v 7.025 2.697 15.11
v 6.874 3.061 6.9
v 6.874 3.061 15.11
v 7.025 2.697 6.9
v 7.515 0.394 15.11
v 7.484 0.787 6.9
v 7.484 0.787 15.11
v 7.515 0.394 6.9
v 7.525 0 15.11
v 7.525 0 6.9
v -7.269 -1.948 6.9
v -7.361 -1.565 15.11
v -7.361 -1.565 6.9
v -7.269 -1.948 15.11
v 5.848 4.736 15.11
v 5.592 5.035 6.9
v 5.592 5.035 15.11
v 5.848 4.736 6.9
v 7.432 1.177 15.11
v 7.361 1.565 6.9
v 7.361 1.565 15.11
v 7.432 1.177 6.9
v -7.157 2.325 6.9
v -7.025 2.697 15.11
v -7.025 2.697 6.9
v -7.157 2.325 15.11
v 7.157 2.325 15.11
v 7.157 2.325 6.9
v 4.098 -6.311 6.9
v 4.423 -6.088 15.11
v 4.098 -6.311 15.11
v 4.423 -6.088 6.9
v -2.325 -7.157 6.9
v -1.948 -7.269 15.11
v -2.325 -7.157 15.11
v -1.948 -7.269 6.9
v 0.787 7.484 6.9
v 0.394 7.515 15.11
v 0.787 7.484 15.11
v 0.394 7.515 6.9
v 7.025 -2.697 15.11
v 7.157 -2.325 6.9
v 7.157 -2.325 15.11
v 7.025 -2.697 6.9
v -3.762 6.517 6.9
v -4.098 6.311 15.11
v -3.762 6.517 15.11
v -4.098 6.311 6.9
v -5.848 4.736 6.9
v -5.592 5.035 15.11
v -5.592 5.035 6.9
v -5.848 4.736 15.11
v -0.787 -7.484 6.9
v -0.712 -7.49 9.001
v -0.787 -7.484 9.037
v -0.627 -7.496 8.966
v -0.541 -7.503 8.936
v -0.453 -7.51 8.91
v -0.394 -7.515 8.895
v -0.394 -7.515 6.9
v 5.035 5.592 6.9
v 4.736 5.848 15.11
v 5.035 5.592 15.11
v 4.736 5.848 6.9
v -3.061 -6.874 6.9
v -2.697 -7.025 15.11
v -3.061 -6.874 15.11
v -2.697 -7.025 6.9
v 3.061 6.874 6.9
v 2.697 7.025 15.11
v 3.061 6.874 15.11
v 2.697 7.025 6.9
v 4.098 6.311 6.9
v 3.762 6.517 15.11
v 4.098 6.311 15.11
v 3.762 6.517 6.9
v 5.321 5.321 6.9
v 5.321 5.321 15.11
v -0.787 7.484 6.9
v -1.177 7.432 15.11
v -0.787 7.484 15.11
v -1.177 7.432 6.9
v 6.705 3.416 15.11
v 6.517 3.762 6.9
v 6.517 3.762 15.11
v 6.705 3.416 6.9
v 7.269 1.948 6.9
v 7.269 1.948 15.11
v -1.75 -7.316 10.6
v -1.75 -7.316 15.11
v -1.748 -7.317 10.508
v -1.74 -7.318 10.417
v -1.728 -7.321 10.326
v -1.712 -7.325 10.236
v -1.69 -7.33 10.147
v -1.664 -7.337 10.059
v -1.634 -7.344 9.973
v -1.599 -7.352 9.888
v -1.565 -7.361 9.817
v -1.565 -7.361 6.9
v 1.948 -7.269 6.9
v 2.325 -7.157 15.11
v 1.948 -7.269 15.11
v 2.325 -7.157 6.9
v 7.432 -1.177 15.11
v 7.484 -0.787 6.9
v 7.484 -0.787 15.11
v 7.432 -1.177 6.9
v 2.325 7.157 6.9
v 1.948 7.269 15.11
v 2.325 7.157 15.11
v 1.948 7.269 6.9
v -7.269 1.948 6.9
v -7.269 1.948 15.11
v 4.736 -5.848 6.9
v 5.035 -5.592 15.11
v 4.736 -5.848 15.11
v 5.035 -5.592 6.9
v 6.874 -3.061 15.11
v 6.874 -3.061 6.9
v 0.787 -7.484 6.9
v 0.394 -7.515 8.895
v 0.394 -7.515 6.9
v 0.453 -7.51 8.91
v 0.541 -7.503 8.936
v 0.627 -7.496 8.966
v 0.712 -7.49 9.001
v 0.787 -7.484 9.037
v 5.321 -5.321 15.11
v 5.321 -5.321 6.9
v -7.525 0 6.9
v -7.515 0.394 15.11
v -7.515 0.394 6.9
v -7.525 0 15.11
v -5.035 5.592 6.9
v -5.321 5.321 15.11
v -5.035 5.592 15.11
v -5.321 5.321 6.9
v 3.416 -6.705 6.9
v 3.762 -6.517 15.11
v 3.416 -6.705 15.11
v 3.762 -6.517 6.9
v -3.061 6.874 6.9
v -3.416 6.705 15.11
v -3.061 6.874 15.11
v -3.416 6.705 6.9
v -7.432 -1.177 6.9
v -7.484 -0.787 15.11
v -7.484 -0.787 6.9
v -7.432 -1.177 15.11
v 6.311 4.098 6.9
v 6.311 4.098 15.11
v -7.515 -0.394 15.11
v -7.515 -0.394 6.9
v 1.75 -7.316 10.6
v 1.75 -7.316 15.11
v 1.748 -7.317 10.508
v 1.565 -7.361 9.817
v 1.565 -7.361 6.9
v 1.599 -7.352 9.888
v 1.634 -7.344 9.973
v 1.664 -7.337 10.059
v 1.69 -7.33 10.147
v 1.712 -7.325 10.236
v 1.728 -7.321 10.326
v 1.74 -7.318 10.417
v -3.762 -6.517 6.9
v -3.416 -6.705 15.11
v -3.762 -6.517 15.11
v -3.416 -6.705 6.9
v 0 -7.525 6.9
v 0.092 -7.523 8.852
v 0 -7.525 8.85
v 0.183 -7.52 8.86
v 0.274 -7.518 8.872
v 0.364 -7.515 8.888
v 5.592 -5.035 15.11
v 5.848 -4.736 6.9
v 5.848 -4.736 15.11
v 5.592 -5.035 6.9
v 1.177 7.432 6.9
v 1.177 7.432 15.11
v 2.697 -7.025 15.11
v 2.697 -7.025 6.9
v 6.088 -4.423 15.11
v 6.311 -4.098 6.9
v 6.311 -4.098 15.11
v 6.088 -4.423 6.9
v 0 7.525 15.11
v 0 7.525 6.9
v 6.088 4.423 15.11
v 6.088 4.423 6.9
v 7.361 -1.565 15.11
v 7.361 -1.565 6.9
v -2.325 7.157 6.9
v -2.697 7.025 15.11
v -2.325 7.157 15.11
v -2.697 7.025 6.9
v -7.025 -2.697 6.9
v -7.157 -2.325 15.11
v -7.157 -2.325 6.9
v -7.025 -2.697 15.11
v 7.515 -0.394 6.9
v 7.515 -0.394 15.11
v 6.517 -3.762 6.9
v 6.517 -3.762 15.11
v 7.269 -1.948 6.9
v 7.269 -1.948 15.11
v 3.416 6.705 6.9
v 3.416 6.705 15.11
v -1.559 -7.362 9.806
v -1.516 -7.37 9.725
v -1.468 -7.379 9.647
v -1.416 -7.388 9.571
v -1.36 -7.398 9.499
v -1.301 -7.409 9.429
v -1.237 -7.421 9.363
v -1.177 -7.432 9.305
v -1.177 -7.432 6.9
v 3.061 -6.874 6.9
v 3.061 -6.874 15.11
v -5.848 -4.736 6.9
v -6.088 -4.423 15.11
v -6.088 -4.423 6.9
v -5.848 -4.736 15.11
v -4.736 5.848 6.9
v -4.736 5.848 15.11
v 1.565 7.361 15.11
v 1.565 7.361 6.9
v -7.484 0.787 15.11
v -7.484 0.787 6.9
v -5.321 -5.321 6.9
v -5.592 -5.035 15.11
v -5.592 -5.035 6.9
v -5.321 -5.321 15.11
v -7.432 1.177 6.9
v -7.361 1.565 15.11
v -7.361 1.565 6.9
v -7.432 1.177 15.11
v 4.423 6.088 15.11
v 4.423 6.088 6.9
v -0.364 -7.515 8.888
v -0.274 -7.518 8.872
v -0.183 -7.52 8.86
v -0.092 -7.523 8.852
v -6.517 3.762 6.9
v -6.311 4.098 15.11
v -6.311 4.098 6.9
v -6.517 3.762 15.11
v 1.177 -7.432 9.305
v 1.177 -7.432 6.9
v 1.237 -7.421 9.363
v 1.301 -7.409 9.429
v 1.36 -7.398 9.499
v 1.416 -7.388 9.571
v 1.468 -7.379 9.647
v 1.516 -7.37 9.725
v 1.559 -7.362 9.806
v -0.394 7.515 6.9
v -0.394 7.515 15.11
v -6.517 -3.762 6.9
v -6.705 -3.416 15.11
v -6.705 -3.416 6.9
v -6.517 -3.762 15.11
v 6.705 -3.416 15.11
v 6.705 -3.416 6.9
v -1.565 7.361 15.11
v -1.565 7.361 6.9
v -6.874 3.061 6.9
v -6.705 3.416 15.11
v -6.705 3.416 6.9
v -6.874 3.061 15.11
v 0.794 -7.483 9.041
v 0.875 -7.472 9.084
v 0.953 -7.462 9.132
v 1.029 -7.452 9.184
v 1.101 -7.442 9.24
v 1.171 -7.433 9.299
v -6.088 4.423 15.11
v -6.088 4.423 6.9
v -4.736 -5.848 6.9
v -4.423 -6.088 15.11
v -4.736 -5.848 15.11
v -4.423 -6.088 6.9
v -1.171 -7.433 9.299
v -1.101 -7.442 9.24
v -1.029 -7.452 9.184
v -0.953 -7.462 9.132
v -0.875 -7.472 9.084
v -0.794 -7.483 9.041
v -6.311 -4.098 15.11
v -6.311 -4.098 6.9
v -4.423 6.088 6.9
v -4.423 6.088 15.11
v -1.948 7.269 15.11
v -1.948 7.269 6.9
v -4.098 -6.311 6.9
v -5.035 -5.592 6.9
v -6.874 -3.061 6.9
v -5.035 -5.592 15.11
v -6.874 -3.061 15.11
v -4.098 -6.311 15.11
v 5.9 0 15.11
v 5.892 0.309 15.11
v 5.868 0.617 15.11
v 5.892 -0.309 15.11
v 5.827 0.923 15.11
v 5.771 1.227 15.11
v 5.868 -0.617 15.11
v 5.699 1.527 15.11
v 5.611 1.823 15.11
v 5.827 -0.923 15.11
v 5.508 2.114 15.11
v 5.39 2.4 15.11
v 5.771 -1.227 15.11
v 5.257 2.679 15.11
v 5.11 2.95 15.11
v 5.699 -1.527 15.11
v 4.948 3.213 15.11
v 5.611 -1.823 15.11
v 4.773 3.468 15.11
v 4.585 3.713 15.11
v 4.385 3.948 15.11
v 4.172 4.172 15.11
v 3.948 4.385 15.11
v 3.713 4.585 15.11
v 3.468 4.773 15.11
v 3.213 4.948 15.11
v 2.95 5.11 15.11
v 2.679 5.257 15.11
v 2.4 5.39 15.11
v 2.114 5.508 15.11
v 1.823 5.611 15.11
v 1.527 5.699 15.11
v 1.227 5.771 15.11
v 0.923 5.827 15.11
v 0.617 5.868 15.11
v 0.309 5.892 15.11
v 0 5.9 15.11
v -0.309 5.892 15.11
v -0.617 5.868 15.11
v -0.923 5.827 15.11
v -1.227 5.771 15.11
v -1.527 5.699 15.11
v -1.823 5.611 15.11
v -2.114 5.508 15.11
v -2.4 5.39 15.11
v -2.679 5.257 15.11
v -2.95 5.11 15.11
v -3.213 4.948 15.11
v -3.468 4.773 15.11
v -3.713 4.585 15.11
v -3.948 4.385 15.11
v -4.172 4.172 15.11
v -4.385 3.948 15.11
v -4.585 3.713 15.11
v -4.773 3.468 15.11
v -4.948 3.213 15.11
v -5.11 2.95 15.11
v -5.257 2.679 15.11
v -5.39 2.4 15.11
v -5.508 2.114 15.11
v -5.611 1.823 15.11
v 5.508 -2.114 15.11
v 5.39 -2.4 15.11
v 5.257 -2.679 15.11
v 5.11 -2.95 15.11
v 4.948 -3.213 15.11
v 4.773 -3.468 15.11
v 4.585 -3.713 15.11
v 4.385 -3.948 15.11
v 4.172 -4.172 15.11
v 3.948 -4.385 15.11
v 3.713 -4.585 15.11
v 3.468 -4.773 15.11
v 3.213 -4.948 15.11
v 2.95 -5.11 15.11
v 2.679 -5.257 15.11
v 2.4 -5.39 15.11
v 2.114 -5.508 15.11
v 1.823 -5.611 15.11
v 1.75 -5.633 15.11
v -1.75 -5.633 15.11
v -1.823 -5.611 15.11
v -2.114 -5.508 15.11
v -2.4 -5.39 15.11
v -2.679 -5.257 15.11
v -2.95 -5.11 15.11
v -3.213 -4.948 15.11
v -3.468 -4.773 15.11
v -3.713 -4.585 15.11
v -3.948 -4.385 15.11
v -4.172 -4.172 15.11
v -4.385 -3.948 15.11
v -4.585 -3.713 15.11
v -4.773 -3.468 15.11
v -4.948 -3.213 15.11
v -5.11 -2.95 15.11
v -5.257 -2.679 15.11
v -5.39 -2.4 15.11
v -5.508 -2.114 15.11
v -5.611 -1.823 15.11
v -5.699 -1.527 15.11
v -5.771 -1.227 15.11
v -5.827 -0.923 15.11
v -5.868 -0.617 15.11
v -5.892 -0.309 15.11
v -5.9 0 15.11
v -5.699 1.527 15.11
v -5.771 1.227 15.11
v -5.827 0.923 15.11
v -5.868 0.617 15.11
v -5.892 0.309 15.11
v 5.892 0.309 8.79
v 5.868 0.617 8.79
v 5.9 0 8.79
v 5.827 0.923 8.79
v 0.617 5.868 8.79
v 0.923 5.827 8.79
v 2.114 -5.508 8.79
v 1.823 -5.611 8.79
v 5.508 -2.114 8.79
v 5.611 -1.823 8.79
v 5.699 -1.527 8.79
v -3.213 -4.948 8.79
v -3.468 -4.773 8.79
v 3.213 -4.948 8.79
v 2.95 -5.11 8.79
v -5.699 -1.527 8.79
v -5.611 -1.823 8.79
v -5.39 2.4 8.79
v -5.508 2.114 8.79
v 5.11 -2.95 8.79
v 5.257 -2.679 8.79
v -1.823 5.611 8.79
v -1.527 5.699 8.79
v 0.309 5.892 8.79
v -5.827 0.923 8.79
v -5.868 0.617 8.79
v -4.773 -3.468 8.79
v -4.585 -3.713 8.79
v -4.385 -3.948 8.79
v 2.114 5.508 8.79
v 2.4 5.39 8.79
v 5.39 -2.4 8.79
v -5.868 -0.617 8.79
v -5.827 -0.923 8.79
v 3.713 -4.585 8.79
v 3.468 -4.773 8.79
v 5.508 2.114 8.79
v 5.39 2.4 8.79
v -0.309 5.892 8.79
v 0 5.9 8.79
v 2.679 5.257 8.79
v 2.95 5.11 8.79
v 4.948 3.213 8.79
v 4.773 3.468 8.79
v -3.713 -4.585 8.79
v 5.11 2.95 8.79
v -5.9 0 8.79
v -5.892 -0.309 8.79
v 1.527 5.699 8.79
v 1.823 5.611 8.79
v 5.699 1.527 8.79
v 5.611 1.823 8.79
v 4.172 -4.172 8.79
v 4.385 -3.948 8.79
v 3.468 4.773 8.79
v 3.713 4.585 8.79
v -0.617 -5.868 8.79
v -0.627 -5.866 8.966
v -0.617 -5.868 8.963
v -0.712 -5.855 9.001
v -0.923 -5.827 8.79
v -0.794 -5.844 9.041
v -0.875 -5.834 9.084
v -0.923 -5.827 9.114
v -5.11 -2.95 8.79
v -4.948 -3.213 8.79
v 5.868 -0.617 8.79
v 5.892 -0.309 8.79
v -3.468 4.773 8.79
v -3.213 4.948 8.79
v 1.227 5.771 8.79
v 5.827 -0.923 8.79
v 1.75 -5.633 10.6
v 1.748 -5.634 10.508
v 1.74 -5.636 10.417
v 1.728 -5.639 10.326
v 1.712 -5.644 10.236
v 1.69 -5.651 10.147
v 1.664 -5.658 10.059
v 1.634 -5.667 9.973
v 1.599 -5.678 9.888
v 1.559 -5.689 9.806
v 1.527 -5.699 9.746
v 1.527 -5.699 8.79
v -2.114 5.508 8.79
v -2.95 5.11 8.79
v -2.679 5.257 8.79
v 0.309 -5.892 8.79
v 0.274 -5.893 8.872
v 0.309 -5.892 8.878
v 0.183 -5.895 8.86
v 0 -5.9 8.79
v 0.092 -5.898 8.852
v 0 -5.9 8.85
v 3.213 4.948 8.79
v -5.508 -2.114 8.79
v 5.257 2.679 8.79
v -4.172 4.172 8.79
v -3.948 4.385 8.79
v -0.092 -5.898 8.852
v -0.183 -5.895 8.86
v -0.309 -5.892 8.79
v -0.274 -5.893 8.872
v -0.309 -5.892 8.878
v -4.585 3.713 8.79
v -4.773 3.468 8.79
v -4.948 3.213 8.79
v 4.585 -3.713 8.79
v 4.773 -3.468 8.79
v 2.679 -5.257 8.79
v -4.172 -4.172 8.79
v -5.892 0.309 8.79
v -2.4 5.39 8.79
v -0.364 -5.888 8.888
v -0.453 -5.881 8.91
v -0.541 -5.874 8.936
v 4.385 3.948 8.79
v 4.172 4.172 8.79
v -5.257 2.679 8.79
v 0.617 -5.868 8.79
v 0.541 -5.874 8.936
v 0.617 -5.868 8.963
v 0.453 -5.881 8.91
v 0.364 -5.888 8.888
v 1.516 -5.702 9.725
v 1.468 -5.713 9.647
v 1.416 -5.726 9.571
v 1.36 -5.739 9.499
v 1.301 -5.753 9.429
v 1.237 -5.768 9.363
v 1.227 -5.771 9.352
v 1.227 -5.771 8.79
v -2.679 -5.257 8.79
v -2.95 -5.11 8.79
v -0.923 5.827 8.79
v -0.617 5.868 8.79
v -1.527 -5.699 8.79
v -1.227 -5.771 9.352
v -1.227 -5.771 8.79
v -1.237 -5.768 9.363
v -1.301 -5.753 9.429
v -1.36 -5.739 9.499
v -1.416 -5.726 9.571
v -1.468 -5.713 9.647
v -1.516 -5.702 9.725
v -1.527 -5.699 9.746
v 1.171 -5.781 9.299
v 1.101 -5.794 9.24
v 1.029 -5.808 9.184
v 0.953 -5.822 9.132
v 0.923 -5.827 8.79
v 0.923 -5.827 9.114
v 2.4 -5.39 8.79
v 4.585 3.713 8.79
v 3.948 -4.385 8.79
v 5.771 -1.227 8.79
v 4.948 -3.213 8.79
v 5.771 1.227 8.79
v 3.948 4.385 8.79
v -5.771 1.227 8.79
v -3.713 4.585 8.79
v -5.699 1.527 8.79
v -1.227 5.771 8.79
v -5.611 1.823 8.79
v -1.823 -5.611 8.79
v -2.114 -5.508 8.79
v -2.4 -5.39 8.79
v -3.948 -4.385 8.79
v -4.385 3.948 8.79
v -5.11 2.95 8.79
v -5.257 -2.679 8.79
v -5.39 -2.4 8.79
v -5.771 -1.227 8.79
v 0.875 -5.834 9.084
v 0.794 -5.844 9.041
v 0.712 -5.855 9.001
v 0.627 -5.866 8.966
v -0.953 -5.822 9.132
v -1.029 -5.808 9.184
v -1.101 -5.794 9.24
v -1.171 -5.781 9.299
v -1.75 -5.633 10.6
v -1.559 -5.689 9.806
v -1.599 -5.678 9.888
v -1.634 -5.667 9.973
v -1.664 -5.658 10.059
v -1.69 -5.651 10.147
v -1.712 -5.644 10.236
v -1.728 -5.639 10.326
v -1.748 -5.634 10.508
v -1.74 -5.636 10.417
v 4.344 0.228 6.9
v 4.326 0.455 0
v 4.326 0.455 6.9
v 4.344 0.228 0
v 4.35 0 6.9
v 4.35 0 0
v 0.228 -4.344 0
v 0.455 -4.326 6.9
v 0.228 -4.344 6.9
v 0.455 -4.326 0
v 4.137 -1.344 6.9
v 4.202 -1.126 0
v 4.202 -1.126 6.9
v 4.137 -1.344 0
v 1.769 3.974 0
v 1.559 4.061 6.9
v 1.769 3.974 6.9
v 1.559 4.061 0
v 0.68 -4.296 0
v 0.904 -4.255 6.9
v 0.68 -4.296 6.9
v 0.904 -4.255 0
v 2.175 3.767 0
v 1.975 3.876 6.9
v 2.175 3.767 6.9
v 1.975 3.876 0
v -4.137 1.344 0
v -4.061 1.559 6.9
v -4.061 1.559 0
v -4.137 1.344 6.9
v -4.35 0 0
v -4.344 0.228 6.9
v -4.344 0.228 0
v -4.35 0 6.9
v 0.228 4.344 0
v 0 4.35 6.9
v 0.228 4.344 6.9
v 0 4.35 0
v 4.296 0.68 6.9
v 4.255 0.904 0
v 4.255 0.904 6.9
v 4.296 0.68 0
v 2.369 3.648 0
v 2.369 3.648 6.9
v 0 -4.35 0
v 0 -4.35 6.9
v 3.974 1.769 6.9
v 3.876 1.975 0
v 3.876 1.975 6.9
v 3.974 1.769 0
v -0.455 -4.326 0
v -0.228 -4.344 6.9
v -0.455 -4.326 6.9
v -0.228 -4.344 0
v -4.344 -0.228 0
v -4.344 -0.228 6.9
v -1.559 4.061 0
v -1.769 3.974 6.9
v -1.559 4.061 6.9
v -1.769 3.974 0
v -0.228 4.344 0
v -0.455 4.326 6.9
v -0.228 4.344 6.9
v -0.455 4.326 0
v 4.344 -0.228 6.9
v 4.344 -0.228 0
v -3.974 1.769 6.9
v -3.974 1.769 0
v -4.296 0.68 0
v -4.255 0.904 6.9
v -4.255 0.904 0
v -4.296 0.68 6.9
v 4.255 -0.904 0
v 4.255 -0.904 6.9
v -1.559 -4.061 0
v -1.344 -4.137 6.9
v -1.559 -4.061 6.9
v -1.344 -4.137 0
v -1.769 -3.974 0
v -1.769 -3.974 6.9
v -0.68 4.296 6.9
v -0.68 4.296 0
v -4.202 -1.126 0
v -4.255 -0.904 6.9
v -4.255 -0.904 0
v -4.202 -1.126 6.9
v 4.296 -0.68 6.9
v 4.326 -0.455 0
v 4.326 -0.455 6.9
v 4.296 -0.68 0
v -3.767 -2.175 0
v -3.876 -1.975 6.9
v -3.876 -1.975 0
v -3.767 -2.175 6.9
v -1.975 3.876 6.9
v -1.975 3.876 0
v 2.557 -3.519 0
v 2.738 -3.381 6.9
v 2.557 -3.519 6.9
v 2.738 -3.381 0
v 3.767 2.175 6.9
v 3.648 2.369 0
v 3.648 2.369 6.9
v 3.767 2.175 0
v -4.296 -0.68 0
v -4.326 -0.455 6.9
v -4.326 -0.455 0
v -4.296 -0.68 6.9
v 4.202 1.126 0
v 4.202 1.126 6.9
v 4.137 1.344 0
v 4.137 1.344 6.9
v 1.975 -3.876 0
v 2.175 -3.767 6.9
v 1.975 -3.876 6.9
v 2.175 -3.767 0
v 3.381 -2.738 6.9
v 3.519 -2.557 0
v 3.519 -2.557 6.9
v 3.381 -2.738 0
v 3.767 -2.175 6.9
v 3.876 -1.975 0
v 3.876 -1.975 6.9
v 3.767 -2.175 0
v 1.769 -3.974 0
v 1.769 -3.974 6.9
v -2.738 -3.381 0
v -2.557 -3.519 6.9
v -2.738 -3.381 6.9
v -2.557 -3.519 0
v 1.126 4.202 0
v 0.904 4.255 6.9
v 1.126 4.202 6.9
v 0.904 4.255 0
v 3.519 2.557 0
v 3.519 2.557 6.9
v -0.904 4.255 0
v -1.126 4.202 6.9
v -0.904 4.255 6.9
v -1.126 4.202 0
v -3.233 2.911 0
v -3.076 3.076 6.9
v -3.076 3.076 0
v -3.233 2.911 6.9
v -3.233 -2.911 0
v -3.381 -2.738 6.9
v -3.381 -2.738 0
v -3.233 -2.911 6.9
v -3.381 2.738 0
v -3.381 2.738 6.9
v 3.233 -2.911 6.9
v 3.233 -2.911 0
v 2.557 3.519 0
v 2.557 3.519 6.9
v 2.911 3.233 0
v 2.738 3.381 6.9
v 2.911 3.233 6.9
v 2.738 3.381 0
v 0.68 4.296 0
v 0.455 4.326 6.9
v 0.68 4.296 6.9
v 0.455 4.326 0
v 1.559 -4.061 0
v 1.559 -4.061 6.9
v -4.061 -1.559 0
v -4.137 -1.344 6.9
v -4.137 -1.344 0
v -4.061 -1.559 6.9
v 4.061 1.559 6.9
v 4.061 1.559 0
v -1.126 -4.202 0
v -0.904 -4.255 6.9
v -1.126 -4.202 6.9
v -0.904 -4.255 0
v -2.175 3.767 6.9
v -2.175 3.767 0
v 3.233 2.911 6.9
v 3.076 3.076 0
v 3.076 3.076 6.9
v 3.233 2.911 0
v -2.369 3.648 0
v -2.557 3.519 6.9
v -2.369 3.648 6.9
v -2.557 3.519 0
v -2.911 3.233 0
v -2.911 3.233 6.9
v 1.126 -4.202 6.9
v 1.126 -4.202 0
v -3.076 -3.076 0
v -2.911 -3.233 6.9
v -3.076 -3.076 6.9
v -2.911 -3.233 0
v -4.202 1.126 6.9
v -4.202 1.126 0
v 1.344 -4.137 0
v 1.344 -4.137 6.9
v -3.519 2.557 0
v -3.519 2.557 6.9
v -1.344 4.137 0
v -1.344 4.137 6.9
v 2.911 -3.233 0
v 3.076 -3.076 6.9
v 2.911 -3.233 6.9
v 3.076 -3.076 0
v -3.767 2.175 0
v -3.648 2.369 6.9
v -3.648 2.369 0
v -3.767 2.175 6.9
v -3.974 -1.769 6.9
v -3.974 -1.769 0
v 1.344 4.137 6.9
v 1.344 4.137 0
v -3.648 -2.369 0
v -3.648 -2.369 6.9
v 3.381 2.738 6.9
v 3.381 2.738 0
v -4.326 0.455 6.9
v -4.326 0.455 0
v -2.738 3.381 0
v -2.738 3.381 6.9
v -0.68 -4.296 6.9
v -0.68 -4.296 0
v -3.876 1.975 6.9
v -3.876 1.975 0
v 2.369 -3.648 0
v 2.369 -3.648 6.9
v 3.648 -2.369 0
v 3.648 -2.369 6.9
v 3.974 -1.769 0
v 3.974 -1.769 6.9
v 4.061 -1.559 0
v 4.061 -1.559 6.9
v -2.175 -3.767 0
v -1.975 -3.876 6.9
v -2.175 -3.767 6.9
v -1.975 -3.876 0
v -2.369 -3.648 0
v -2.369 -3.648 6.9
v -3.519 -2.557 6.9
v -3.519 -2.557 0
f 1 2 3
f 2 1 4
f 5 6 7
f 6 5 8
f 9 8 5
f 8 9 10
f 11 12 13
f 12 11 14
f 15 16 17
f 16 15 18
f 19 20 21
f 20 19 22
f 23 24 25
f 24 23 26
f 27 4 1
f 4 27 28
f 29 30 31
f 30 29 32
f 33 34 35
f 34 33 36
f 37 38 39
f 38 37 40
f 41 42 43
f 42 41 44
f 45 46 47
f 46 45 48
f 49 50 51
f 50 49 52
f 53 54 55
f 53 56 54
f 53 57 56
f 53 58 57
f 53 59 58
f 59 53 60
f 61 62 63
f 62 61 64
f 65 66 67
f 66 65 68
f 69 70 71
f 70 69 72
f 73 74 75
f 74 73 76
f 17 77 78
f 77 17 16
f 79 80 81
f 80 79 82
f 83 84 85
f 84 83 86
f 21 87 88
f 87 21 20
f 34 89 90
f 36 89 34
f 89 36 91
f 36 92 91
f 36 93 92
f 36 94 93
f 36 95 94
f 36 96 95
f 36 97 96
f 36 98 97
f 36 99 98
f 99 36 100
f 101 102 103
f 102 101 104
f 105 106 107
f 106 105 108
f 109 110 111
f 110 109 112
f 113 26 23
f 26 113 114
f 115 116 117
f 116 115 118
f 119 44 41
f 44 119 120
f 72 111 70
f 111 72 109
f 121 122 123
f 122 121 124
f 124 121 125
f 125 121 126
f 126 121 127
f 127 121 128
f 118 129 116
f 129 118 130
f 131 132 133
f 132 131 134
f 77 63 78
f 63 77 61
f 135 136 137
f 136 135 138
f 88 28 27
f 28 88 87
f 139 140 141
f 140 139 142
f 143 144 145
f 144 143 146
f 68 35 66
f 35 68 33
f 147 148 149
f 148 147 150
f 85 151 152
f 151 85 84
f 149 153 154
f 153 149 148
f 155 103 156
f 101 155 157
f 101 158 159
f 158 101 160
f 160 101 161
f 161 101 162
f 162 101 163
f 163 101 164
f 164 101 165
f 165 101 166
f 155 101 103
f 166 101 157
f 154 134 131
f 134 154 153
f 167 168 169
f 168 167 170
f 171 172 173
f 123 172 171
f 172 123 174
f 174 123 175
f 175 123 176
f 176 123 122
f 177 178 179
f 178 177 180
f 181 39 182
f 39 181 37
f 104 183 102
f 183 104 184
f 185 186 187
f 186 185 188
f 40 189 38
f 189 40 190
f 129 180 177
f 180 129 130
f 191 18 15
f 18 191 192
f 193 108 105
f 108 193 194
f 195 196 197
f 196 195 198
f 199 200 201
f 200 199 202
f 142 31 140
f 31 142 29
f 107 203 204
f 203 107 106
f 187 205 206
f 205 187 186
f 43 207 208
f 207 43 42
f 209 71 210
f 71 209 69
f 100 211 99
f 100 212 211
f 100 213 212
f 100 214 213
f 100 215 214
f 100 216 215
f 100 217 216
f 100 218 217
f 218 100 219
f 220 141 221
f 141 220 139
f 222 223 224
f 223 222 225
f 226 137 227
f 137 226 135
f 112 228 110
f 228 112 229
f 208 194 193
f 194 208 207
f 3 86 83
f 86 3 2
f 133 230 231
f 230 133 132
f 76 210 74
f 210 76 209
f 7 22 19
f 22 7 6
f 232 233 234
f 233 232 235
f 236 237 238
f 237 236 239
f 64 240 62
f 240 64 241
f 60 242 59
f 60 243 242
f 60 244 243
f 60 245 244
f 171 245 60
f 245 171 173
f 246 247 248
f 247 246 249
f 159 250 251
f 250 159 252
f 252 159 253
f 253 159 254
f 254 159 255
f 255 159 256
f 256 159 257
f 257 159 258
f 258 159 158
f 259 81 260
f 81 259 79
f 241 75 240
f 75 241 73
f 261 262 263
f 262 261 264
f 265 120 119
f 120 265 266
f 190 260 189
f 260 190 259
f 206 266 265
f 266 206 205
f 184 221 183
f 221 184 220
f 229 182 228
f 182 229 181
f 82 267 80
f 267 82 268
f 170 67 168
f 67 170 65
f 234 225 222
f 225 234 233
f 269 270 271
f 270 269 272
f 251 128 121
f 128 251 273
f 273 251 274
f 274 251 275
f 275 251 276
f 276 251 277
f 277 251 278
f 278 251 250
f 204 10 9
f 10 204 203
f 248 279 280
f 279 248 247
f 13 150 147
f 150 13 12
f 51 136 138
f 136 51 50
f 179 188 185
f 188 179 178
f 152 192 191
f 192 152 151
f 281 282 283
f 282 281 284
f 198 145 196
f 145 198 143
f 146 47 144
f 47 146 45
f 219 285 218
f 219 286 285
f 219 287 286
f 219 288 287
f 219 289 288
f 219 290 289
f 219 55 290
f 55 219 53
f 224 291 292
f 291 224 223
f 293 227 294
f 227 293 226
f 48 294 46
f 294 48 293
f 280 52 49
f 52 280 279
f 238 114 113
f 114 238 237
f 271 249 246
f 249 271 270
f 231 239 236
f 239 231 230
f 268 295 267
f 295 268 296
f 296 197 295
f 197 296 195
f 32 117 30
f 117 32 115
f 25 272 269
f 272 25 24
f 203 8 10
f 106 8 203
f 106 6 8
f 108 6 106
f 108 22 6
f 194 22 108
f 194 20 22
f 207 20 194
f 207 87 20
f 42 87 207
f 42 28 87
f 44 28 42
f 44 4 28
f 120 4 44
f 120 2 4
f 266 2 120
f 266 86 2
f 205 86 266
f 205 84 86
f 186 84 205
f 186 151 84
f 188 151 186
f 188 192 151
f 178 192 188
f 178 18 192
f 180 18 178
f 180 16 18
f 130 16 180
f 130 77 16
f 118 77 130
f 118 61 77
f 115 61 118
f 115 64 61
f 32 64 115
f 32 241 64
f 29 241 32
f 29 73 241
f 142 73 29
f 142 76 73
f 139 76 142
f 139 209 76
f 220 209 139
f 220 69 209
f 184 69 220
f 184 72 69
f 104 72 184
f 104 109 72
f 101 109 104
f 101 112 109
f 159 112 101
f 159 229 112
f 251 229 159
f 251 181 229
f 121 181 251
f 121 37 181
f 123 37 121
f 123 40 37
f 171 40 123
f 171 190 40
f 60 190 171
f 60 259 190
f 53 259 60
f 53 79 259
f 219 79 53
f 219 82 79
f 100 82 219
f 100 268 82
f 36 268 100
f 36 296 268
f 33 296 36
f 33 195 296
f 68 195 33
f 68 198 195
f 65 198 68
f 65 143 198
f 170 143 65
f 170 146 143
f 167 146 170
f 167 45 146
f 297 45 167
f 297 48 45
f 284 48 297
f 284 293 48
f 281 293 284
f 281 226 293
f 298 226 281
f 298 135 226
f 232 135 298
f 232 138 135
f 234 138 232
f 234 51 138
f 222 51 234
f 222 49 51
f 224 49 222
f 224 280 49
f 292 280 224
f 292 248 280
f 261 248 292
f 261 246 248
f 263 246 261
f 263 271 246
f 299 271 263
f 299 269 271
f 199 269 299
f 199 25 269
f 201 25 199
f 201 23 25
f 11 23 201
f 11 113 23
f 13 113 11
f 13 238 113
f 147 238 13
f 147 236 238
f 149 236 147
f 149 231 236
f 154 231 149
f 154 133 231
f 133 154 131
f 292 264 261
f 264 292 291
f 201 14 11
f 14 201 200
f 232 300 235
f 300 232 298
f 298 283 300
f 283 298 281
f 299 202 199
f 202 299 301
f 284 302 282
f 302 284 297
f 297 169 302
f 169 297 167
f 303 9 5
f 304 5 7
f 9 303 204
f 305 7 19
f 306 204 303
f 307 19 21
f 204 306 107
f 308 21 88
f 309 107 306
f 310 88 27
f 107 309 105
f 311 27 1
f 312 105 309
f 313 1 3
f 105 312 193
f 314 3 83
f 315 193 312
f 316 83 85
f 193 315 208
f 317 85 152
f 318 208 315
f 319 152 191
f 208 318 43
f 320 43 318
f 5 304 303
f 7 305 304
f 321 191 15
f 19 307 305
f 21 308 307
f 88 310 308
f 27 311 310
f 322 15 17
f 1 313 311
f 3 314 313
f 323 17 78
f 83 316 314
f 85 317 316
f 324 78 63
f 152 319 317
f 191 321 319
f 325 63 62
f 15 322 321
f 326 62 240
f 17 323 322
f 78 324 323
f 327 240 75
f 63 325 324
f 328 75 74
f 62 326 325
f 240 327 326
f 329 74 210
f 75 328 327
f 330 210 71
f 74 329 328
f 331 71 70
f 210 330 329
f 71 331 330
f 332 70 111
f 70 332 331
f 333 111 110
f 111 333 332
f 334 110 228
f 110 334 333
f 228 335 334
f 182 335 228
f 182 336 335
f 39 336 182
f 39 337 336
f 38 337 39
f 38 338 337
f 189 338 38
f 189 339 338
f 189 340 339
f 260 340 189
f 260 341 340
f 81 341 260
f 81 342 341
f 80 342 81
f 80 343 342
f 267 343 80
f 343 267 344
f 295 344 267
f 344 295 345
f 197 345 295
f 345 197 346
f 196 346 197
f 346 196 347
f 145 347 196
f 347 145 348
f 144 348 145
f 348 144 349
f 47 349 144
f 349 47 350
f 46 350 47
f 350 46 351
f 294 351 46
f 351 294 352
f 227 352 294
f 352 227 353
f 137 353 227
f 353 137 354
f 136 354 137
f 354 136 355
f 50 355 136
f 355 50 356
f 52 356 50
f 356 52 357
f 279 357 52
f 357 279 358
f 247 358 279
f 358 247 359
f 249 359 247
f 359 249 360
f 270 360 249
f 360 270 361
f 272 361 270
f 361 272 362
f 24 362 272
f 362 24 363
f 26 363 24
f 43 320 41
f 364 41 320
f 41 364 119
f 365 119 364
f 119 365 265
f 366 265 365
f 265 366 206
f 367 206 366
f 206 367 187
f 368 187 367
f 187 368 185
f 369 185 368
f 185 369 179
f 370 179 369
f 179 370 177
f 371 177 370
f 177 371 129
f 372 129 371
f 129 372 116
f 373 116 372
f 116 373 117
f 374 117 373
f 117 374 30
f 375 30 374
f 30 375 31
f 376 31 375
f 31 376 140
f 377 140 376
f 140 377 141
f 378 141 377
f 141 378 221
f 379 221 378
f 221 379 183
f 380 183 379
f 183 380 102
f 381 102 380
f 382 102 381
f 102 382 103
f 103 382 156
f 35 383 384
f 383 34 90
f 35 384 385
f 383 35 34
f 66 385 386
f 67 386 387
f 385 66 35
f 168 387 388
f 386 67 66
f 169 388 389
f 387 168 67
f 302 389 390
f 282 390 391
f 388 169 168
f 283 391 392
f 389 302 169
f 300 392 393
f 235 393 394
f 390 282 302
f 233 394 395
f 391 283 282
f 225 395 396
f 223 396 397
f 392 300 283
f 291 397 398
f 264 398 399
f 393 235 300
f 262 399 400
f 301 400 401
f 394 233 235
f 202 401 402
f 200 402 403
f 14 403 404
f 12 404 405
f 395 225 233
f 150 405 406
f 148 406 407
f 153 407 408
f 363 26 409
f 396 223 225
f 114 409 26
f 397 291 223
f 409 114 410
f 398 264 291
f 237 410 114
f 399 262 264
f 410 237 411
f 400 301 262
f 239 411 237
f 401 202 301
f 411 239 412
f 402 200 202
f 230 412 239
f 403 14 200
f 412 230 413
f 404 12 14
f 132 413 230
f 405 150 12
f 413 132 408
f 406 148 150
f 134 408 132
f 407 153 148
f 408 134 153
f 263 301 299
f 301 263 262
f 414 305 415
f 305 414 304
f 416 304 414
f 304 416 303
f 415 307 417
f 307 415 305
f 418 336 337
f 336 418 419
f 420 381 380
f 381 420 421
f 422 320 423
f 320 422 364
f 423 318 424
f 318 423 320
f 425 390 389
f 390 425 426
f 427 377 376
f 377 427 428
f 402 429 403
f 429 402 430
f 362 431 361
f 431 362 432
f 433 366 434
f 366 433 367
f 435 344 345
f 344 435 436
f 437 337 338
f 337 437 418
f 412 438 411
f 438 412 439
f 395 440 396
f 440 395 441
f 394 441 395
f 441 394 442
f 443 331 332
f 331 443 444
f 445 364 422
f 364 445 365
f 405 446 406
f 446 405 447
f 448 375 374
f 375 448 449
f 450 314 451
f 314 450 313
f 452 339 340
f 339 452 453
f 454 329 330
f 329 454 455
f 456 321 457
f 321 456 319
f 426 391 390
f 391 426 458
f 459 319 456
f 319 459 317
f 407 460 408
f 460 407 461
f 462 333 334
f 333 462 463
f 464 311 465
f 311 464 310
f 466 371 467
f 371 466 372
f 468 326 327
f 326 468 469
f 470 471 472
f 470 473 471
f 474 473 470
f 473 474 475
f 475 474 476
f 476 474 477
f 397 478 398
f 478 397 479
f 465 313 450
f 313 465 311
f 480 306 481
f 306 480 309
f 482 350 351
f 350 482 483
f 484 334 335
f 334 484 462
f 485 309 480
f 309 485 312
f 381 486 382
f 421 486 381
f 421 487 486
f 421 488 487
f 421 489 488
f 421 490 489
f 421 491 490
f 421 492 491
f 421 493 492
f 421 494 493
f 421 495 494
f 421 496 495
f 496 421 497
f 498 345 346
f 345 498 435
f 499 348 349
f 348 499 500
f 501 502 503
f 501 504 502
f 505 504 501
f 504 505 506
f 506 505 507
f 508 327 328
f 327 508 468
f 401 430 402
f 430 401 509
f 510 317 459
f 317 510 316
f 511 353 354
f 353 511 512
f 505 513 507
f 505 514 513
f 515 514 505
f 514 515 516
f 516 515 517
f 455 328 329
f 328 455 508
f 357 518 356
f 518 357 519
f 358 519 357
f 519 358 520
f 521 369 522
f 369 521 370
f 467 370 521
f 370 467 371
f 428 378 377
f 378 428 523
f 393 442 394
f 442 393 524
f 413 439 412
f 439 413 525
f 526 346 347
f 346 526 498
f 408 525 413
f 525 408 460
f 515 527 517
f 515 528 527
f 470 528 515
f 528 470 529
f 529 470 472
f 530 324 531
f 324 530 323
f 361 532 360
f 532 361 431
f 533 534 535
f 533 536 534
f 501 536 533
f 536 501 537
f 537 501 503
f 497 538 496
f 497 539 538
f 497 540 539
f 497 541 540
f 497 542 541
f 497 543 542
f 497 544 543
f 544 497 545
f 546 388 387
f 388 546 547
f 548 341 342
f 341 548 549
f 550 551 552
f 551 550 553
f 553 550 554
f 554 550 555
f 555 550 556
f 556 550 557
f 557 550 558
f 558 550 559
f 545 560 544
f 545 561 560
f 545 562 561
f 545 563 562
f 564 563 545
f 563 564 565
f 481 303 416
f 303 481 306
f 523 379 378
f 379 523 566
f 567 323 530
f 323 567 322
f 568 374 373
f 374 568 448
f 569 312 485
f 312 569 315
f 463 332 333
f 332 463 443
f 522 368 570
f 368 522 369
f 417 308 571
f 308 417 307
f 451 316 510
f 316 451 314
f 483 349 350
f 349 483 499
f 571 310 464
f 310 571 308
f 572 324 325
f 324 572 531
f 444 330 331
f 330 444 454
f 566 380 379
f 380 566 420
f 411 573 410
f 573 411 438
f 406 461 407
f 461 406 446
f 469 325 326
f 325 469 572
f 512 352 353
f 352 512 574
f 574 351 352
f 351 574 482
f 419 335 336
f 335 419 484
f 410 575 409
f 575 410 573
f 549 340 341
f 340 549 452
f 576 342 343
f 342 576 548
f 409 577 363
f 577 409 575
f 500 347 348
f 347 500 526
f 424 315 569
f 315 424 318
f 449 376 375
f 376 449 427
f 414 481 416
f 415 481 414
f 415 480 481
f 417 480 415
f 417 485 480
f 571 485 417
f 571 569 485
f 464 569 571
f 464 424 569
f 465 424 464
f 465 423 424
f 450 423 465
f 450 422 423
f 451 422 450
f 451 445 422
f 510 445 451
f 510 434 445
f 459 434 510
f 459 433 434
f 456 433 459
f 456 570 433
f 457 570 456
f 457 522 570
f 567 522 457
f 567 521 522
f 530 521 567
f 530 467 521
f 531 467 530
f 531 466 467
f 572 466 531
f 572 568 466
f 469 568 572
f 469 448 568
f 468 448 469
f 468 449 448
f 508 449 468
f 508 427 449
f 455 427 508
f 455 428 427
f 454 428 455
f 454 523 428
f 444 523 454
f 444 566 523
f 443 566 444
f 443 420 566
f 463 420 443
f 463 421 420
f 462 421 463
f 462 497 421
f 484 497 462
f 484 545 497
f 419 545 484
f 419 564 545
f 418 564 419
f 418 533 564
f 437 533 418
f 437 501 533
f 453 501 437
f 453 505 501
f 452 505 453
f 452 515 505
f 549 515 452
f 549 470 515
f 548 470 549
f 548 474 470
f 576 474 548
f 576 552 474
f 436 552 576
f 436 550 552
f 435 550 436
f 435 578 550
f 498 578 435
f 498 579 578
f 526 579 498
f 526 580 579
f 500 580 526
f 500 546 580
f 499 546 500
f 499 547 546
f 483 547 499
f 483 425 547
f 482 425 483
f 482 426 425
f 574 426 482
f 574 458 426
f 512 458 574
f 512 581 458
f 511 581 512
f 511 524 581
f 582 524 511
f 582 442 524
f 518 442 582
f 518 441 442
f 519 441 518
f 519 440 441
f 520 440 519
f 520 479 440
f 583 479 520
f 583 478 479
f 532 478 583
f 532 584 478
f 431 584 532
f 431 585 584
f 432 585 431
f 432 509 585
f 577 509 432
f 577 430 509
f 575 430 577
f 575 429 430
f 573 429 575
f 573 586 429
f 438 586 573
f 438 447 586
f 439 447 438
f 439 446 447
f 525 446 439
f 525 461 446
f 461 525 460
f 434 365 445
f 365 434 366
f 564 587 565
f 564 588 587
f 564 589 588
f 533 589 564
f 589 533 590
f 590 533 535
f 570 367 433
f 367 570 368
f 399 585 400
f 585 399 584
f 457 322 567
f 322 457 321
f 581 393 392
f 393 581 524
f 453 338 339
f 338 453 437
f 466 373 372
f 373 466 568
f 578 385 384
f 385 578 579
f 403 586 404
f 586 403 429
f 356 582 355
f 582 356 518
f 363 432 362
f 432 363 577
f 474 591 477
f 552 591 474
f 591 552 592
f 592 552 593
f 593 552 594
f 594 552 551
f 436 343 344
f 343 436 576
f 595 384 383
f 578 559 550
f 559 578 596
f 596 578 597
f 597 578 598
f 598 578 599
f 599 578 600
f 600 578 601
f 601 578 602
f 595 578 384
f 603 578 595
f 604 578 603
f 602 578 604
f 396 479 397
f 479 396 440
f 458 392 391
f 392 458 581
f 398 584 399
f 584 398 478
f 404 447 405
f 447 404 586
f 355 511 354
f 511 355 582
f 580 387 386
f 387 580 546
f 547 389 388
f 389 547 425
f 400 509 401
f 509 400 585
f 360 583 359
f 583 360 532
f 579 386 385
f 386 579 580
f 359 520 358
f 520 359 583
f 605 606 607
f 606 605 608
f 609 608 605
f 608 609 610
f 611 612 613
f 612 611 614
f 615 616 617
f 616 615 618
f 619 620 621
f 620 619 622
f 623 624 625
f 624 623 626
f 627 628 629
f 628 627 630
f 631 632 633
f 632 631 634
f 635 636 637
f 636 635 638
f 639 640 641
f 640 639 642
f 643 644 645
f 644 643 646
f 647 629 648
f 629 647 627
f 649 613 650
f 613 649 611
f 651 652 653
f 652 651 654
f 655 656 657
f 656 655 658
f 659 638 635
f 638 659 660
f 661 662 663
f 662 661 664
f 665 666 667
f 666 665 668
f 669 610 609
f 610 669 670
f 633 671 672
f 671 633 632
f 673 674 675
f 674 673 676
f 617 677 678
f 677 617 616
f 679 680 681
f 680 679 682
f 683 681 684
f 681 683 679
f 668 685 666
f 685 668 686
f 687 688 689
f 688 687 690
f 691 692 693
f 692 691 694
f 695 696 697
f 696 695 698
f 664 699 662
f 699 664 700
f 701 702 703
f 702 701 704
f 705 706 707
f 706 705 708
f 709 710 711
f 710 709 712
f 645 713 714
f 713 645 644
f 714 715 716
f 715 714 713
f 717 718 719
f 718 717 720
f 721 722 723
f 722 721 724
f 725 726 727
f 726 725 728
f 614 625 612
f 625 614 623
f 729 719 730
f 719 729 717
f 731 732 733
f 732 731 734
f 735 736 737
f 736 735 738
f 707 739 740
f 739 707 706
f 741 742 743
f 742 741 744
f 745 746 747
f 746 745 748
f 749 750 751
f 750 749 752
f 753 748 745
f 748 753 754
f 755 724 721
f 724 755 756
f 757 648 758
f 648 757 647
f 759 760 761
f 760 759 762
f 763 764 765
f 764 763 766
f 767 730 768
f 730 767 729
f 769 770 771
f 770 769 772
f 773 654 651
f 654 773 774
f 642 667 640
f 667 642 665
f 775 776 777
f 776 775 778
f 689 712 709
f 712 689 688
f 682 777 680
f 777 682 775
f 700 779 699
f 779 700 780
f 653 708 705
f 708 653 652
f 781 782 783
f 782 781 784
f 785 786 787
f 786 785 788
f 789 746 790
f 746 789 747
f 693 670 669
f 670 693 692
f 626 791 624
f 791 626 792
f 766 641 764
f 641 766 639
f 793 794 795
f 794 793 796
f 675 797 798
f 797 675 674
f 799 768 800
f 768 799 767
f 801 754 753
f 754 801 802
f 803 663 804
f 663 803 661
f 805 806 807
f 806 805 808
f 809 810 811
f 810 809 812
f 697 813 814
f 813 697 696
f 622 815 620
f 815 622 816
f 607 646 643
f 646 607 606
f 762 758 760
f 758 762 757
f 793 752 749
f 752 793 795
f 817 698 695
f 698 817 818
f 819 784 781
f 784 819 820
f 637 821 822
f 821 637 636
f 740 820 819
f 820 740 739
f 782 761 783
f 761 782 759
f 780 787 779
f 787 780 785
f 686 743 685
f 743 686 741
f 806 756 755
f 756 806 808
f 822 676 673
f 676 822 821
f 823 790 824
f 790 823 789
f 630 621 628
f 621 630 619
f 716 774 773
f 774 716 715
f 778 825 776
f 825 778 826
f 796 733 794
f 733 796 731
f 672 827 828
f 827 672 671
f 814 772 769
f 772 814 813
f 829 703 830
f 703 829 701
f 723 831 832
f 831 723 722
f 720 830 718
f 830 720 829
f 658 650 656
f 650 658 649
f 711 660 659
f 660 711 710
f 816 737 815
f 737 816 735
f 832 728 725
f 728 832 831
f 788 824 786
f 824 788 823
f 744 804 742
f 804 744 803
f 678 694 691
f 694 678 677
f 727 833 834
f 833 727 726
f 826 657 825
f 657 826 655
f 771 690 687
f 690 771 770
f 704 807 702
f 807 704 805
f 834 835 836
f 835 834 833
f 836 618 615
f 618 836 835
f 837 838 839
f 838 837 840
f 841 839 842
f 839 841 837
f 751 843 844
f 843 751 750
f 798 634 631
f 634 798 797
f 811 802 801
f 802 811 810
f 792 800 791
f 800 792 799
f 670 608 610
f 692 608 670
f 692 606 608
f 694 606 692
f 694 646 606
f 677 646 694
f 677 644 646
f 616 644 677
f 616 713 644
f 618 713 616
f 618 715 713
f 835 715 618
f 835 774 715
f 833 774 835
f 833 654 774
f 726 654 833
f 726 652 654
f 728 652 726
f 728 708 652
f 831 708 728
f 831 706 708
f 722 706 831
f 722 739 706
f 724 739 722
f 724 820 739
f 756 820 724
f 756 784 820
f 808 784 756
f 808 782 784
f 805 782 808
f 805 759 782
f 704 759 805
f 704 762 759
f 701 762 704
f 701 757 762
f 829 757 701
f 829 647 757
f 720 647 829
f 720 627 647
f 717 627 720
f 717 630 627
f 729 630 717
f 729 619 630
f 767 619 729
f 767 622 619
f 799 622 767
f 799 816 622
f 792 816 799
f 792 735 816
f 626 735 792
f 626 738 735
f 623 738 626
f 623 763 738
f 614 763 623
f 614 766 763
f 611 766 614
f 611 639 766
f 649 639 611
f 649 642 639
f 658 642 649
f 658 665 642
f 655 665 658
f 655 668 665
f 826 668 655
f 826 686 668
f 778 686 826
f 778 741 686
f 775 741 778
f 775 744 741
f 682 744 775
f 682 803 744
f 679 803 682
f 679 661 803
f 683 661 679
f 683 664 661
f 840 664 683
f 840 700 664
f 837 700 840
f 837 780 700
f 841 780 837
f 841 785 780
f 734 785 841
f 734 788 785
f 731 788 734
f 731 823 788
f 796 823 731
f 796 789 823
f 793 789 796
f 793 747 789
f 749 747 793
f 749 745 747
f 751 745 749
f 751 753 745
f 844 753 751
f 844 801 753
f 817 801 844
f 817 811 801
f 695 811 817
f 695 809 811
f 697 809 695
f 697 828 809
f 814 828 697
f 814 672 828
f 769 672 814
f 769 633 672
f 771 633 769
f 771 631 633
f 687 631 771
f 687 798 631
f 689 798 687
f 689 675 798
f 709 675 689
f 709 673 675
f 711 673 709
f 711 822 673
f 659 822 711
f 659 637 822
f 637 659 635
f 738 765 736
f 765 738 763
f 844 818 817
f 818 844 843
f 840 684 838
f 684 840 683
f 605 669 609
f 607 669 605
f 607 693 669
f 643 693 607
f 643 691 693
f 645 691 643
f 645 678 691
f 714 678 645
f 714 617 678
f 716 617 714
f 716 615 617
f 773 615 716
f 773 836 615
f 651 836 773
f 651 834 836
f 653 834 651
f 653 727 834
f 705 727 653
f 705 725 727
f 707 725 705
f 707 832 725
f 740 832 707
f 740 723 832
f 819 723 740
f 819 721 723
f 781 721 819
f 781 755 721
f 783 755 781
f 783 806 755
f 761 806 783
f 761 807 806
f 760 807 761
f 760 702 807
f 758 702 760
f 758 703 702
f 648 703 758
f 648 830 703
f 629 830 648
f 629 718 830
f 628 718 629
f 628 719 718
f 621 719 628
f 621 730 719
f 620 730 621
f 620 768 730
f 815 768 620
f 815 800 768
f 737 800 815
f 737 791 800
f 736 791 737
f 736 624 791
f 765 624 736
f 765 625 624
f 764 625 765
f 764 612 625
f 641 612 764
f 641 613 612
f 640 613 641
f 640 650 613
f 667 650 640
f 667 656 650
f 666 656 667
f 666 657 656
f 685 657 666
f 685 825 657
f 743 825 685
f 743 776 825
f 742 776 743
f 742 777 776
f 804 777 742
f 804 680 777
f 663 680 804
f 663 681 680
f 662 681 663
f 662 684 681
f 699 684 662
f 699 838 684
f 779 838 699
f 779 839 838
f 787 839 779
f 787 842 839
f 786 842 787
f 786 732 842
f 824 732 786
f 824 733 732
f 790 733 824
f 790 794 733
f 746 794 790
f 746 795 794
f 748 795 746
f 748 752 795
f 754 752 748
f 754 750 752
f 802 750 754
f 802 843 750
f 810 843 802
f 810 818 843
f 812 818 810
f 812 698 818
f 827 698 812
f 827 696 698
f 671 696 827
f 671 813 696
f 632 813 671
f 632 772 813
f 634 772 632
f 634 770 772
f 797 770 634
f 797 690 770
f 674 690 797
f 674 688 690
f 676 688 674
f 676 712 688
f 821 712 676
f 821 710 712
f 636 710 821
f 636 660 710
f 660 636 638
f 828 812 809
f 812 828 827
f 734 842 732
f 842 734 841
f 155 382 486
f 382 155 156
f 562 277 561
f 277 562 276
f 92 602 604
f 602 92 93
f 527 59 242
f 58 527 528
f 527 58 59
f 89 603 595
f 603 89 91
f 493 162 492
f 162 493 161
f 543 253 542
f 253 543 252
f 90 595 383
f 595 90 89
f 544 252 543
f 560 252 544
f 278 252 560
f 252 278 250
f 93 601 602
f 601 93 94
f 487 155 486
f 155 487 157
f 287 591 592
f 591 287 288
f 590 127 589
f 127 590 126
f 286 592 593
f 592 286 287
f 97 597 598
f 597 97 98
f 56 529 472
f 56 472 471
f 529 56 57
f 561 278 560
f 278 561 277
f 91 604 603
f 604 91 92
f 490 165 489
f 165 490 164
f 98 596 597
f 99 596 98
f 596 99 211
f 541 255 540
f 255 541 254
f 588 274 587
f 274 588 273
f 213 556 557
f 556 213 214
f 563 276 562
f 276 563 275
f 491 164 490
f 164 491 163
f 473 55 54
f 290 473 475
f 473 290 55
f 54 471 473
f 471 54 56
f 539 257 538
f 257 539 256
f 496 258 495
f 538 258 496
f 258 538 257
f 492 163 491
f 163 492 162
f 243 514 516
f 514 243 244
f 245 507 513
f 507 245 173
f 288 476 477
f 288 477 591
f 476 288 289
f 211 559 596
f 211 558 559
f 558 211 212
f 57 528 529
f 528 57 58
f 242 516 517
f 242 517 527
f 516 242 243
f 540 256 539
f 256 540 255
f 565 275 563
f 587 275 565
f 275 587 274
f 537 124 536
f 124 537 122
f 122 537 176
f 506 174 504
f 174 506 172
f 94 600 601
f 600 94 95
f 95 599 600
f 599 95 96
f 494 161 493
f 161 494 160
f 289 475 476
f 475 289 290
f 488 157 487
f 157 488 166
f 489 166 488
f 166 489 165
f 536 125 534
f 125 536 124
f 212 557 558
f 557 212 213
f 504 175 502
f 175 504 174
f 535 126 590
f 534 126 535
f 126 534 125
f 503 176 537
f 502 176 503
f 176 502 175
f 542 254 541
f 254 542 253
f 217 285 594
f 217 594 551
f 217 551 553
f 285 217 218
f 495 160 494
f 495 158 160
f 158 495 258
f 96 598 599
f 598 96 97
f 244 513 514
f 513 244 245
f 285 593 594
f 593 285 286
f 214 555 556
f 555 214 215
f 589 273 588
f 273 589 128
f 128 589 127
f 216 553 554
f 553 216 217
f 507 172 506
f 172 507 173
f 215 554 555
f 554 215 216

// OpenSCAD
$fn=120;

module adapter() {
    cylinder(d=8.7,h=6.9);
    translate([0,0,6.9]) difference() {
        cylinder(d=15.05,h=8.21);
        translate([0,0,8.21-6.33+0.01]) cylinder(d=11.8,h=6.33);
    }
}

module insert() {
    translate([0,0,10.6]) rotate([90,0,0]) hull() {
        cylinder(d=3.5,h=15);
        translate([0,15,0]) cylinder(d=3.5,h=15);
    }
}

difference() {
    adapter();
    insert();
}
